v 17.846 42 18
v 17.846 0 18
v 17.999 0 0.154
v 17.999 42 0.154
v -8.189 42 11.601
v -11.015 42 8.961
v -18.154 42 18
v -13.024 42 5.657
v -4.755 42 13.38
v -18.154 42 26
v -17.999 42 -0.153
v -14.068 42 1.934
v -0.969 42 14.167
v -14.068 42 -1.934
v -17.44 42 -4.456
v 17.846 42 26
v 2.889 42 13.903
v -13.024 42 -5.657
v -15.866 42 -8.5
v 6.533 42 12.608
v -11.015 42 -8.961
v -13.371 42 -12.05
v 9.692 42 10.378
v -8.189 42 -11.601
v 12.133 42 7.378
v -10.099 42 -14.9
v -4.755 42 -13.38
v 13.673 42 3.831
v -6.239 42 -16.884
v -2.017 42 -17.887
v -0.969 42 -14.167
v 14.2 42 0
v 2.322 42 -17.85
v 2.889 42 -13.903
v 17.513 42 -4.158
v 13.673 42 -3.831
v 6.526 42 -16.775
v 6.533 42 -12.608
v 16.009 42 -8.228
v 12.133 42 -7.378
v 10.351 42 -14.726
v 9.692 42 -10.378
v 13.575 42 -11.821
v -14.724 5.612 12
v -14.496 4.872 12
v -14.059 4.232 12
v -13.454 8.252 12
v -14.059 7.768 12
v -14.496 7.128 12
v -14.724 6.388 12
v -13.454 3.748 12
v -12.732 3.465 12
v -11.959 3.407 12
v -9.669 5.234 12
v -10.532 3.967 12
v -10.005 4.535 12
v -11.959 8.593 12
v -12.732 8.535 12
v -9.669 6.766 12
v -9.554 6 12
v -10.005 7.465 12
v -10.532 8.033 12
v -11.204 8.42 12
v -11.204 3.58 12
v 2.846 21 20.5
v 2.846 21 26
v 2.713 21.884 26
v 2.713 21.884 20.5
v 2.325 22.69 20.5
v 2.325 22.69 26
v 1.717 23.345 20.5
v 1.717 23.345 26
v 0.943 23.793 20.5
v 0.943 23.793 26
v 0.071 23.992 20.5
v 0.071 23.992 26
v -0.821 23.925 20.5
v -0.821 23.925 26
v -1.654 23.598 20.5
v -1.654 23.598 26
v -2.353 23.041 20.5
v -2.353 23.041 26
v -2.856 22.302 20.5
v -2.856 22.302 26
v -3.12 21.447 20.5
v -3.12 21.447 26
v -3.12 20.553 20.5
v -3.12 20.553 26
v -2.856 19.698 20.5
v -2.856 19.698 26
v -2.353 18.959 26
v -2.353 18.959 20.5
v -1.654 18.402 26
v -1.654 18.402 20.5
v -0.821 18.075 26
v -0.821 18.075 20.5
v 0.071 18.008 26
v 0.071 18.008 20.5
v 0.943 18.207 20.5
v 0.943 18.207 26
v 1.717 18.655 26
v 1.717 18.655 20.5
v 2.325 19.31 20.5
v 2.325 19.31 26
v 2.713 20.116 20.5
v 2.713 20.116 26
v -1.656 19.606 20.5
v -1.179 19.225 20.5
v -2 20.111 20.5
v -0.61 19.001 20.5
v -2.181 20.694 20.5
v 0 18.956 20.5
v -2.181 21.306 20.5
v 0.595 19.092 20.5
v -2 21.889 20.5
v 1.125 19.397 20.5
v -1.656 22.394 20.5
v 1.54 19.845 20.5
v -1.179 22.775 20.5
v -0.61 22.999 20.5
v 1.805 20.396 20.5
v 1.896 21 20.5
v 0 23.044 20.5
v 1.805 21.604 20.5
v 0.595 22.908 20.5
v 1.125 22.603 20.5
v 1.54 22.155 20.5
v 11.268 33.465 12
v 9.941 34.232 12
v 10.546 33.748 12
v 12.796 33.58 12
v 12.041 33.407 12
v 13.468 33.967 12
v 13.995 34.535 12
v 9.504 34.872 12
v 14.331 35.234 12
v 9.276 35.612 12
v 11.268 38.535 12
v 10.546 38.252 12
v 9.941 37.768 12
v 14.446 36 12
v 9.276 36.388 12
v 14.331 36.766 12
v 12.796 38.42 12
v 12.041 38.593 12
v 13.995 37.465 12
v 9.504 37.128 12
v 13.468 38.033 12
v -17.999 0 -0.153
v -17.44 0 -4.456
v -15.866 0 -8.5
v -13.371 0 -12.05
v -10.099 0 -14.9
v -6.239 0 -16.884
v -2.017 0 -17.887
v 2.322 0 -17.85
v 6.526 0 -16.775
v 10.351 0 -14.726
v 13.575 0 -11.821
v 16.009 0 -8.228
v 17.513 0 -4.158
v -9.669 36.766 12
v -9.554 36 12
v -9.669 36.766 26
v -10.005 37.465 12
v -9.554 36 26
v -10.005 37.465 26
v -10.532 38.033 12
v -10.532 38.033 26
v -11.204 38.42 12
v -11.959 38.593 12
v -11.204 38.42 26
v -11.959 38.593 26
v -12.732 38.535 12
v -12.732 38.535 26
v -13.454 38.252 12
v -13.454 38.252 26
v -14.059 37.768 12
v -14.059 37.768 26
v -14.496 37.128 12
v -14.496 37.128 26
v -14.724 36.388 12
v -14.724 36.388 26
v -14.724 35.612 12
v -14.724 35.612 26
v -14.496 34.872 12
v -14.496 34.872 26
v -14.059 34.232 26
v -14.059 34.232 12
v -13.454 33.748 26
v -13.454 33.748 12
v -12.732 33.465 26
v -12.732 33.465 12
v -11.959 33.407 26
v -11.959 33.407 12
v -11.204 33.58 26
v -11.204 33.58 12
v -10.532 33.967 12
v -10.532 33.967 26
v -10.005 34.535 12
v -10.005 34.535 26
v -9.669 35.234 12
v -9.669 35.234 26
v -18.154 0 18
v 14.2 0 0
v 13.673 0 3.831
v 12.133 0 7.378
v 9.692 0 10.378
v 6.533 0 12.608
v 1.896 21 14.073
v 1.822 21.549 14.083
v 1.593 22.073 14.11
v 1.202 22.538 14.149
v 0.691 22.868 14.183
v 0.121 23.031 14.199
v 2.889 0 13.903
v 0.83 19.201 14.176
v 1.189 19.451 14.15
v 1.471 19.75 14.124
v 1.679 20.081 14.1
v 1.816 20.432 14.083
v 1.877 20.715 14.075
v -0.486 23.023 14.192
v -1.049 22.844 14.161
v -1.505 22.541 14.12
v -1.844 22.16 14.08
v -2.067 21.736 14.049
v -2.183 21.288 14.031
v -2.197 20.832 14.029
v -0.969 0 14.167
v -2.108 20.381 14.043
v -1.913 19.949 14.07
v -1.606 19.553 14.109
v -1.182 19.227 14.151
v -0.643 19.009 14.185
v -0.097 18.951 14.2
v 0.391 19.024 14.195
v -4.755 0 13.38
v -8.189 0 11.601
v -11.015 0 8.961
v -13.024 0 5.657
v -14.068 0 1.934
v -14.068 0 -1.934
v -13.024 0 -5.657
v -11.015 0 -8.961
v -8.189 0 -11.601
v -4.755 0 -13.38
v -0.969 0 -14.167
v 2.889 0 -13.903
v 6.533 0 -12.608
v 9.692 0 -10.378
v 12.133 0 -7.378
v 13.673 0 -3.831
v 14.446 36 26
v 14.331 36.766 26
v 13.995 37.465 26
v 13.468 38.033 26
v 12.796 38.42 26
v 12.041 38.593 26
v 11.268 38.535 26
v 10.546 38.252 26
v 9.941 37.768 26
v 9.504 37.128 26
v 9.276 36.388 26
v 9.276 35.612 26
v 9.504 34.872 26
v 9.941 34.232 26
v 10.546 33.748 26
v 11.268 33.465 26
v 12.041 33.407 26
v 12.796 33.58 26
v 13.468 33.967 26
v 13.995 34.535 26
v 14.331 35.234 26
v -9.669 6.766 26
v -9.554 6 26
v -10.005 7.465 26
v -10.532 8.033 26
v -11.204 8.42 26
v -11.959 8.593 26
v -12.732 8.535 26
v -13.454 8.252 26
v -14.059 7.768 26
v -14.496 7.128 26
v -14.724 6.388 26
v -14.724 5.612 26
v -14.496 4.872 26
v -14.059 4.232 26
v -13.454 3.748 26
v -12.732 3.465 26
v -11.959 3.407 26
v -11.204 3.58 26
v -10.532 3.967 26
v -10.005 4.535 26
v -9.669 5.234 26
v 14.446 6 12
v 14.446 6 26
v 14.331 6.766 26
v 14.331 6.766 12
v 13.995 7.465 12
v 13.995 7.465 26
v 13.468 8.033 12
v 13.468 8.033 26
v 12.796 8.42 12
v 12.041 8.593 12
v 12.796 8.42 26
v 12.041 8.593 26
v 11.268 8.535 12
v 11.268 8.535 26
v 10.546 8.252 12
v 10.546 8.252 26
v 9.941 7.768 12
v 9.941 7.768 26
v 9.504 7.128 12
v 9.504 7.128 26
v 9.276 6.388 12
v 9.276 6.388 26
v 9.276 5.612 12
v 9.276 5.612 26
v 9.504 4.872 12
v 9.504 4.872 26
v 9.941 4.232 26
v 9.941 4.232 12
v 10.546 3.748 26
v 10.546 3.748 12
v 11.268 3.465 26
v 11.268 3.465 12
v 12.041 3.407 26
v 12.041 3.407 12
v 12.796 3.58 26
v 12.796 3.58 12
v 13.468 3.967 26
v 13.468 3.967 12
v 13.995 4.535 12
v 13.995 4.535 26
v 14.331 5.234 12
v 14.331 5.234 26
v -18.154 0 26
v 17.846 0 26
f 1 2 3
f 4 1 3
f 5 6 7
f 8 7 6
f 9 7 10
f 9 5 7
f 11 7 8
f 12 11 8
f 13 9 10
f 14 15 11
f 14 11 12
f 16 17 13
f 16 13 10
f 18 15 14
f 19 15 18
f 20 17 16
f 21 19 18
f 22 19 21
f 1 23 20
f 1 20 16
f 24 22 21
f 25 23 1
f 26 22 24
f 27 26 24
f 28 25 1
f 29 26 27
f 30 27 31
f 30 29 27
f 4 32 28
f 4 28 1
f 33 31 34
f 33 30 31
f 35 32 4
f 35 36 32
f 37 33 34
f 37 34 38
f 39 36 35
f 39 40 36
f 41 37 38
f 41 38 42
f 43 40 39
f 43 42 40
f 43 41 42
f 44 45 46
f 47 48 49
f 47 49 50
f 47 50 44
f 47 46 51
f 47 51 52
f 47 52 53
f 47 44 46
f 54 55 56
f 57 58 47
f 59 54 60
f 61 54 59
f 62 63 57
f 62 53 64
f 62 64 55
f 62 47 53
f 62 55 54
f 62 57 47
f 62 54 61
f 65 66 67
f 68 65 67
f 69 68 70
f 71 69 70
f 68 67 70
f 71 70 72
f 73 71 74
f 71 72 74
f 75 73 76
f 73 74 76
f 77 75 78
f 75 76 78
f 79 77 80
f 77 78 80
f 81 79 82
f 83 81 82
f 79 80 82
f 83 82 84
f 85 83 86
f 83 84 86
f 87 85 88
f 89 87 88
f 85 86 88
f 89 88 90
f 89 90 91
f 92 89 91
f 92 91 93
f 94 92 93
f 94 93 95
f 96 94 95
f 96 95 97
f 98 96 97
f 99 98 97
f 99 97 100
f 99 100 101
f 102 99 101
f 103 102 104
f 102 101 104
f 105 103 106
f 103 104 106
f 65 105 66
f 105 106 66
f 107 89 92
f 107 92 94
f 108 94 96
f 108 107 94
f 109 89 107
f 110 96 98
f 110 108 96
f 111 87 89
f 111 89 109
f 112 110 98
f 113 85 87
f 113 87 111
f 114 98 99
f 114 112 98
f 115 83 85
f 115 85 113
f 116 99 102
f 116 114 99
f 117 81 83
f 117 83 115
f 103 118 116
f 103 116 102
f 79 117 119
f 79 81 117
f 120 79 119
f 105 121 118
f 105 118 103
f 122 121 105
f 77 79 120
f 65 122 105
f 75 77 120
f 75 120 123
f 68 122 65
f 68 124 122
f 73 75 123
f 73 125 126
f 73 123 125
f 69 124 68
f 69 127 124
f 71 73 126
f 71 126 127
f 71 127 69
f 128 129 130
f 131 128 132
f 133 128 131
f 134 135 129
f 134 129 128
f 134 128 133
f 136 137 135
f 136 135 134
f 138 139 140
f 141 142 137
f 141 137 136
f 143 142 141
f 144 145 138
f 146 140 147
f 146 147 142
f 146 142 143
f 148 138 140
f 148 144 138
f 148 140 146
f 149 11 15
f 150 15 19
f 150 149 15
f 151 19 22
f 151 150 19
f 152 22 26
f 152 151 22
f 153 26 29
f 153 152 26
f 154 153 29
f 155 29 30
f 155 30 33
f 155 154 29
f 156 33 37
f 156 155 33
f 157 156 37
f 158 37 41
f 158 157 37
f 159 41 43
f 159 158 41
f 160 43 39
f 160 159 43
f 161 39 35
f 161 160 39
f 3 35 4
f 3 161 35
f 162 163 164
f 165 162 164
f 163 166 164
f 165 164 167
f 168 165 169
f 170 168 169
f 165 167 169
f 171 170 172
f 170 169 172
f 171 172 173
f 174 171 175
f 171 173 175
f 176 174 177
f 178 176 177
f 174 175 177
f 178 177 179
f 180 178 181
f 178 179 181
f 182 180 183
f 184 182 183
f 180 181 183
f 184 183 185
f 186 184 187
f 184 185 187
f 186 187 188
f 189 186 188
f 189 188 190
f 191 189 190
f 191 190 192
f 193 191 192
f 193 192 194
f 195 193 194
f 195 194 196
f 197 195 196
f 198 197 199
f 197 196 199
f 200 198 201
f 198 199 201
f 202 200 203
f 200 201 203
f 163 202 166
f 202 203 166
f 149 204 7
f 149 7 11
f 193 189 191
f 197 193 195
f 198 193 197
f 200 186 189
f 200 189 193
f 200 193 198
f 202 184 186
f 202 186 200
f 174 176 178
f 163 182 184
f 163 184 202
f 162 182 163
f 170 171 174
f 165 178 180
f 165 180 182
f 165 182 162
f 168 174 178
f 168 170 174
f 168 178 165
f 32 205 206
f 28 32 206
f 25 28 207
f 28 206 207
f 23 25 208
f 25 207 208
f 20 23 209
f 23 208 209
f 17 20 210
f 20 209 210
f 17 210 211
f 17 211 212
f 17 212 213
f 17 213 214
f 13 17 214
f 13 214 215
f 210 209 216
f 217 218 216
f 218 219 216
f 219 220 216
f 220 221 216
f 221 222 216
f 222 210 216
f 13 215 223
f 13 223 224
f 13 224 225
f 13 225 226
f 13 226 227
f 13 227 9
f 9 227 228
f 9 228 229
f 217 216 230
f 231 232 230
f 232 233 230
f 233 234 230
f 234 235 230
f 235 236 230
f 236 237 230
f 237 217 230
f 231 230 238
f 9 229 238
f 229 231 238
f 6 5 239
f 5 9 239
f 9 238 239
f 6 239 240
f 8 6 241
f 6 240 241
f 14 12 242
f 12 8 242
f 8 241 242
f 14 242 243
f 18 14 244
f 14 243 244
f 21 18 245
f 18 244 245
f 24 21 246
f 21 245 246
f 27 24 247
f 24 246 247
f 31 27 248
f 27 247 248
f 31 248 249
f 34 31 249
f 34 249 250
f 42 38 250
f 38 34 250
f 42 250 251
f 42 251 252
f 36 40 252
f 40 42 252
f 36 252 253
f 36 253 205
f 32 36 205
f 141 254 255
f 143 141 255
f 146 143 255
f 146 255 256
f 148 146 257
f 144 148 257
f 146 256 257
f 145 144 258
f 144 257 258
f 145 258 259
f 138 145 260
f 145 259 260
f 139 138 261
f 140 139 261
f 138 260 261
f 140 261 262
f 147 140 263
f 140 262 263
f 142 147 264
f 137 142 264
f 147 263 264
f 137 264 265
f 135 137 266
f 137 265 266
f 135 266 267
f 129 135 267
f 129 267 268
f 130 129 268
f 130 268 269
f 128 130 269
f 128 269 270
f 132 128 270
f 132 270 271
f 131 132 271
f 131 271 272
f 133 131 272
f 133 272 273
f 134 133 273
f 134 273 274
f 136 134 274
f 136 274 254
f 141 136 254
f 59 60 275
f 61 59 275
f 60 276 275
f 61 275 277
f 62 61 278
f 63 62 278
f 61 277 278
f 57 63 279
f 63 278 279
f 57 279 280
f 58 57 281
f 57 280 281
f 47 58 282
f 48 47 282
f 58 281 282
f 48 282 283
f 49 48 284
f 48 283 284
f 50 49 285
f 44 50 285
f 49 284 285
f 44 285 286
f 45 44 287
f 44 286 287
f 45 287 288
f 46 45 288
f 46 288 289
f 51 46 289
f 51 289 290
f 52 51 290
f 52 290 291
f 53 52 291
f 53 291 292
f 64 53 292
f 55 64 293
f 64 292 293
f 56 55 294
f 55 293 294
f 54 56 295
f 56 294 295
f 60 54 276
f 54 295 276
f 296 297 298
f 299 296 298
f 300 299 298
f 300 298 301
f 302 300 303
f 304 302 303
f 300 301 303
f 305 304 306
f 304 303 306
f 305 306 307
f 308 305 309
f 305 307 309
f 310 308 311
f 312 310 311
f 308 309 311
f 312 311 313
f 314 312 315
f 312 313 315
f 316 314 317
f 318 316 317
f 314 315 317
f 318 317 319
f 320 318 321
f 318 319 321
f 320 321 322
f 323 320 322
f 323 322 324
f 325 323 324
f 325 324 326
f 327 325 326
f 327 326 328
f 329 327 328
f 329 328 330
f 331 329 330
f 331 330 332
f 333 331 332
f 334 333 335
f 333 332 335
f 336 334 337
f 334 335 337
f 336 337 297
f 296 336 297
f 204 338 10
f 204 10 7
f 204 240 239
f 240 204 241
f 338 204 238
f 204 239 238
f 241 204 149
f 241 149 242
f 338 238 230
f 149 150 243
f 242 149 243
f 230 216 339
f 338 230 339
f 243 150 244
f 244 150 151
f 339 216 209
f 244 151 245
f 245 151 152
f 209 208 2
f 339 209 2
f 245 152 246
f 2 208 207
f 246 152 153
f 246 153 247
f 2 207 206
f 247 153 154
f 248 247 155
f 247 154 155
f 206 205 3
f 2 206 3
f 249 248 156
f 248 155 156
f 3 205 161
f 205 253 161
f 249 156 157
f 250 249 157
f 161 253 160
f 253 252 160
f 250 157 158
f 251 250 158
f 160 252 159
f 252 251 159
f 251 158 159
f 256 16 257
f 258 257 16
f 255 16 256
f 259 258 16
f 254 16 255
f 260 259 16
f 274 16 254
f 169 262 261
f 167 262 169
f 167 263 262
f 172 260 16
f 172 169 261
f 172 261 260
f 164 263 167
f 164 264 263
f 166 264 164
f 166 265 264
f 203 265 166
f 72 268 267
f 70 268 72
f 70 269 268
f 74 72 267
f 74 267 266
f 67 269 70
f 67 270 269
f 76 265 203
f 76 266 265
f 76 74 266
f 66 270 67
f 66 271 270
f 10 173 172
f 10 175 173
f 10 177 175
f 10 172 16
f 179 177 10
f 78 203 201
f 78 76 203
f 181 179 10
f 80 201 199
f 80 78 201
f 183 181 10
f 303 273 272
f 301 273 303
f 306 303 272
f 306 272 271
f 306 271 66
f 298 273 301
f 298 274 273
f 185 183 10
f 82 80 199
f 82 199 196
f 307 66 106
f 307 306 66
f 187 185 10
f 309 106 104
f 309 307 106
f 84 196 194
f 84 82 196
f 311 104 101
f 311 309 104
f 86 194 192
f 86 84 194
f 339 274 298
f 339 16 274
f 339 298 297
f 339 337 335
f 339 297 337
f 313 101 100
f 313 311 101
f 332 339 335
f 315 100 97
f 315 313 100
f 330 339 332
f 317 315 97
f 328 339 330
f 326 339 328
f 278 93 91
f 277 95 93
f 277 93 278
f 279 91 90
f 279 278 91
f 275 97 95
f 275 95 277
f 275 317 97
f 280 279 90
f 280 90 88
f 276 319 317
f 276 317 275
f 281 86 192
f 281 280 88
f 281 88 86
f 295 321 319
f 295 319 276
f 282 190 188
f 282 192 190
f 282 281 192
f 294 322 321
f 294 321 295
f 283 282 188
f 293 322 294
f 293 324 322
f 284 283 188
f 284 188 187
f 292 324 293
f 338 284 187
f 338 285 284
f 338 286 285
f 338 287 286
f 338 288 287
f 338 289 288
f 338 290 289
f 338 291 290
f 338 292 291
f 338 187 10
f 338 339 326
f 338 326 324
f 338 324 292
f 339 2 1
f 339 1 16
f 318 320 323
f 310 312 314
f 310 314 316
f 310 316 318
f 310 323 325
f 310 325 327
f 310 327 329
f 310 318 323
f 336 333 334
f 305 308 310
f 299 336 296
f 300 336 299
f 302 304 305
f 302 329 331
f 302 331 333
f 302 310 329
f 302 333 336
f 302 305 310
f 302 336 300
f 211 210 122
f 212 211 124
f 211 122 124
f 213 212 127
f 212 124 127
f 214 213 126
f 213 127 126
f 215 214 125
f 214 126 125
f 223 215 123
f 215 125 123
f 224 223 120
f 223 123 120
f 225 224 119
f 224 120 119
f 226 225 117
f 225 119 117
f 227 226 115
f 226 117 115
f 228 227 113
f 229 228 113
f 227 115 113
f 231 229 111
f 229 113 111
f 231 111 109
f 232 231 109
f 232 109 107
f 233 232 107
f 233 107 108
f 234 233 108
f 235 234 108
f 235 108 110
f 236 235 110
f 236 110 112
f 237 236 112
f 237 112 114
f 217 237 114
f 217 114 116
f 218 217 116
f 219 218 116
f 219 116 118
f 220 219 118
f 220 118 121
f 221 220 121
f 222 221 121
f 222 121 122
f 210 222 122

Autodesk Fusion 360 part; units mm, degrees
sketch "Skizze1" plane through (0, 0, 0) normal (0, 1, 0) x (1, 0, 0)
  circle A0 centre (0, 0) radius 14.2
  line L0 (-18.1535, -18) -> (17.8465, -18)
  line L1 (17.8465, -18) -> (17.8465, -26)
  line L2 (17.8465, -26) -> (-18.1535, -26)
  line L3 (-18.1535, -26) -> (-18.1535, -18)
  line L4 (-18.1535, -18) -> (17.8465, -26) construction
  line L5 (17.8465, -18) -> (-18.1535, -26) construction
  circle A1 centre (0, 0) radius 18
  line L6 (-18.1535, -18) -> (-17.9994, 0.1529)
  line L7 (17.8465, -18) -> (17.9993, -0.1542)
  point P0 (-0.1535, -22)
  dimension "d1" = 28.4
  dimension "d2" = 36
  dimension "d3" = 8
  dimension "d4" = 36
extrude "Extrusion1" add sketch "Skizze1" along normal blind 42
sketch "Skizze3" plane through (0, 0, 26) normal (0, 0, 1) x (1, 0, 0)
  line L0 (-18.1535, 0) -> (17.8465, 0)
  line L1 (17.8465, 0) -> (17.8465, 42)
  line L2 (17.8465, 42) -> (-18.1535, 42)
  line L3 (-18.1535, 42) -> (-18.1535, 0)
  circle A0 centre (-12.1535, 36) radius 2.6
  circle A1 centre (11.8465, 36) radius 2.6
  circle A2 centre (-12.1535, 6) radius 2.6
  circle A3 centre (11.8465, 6) radius 2.6
  dimension "d7" = 5.2
  dimension "d8" = 5.2
  dimension "d9" = 5.2
  dimension "d10" = 5.2
  dimension "d11" = 24
  dimension "d12" = 24
  dimension "d13" = 30
  dimension "d14" = 30
  dimension "d15" = 6
  dimension "d16" = 6
  dimension "d17" = 6
extrude "Extrusion2" cut sketch "Skizze3" against normal blind 14 contours A0 | A1 | A2 | A3
sketch "Skizze4" plane through (0, 0, 26) normal (0, 0, 1) x (1, 0, 0)
  circle A0 centre (-12.1535, 6) radius 2.6
  circle A1 centre (11.8465, 36) radius 2.6
  circle A2 centre (-12.1535, 36) radius 2.6
  circle A3 centre (11.8465, 6) radius 2.6
  line L0 (-18.1535, 0) -> (17.8465, 0)
  line L1 (17.8465, 0) -> (17.8465, 42)
  line L2 (17.8465, 42) -> (-18.1535, 42)
  line L3 (-18.1535, 42) -> (-18.1535, 0)
  line L4 (-18.1535, 0) -> (17.8465, 42) construction
  line L5 (17.8465, 0) -> (-18.1535, 42) construction
  circle A4 centre (-0.1535, 21) radius 3
  circle A5 centre (-0.1535, 21) radius 2.05
  dimension "d20" = 6
  dimension "d21" = 4.1
extrude "Extrusion3" cut sketch "Skizze4" against normal blind 16 contours A5
extrude "Extrusion4" cut sketch "Skizze4" against normal blind 5.5 contours A4
equation "d8 = d7"
equation "d9 = d7"
equation "d10 = d7"
equation "d15 = ( ( 36 - 24 ) / 2 ) * 1 mm"
equation "d16 = ( ( 42 - 30 ) / 2 ) * 1 mm"
equation "d17 = d15"
